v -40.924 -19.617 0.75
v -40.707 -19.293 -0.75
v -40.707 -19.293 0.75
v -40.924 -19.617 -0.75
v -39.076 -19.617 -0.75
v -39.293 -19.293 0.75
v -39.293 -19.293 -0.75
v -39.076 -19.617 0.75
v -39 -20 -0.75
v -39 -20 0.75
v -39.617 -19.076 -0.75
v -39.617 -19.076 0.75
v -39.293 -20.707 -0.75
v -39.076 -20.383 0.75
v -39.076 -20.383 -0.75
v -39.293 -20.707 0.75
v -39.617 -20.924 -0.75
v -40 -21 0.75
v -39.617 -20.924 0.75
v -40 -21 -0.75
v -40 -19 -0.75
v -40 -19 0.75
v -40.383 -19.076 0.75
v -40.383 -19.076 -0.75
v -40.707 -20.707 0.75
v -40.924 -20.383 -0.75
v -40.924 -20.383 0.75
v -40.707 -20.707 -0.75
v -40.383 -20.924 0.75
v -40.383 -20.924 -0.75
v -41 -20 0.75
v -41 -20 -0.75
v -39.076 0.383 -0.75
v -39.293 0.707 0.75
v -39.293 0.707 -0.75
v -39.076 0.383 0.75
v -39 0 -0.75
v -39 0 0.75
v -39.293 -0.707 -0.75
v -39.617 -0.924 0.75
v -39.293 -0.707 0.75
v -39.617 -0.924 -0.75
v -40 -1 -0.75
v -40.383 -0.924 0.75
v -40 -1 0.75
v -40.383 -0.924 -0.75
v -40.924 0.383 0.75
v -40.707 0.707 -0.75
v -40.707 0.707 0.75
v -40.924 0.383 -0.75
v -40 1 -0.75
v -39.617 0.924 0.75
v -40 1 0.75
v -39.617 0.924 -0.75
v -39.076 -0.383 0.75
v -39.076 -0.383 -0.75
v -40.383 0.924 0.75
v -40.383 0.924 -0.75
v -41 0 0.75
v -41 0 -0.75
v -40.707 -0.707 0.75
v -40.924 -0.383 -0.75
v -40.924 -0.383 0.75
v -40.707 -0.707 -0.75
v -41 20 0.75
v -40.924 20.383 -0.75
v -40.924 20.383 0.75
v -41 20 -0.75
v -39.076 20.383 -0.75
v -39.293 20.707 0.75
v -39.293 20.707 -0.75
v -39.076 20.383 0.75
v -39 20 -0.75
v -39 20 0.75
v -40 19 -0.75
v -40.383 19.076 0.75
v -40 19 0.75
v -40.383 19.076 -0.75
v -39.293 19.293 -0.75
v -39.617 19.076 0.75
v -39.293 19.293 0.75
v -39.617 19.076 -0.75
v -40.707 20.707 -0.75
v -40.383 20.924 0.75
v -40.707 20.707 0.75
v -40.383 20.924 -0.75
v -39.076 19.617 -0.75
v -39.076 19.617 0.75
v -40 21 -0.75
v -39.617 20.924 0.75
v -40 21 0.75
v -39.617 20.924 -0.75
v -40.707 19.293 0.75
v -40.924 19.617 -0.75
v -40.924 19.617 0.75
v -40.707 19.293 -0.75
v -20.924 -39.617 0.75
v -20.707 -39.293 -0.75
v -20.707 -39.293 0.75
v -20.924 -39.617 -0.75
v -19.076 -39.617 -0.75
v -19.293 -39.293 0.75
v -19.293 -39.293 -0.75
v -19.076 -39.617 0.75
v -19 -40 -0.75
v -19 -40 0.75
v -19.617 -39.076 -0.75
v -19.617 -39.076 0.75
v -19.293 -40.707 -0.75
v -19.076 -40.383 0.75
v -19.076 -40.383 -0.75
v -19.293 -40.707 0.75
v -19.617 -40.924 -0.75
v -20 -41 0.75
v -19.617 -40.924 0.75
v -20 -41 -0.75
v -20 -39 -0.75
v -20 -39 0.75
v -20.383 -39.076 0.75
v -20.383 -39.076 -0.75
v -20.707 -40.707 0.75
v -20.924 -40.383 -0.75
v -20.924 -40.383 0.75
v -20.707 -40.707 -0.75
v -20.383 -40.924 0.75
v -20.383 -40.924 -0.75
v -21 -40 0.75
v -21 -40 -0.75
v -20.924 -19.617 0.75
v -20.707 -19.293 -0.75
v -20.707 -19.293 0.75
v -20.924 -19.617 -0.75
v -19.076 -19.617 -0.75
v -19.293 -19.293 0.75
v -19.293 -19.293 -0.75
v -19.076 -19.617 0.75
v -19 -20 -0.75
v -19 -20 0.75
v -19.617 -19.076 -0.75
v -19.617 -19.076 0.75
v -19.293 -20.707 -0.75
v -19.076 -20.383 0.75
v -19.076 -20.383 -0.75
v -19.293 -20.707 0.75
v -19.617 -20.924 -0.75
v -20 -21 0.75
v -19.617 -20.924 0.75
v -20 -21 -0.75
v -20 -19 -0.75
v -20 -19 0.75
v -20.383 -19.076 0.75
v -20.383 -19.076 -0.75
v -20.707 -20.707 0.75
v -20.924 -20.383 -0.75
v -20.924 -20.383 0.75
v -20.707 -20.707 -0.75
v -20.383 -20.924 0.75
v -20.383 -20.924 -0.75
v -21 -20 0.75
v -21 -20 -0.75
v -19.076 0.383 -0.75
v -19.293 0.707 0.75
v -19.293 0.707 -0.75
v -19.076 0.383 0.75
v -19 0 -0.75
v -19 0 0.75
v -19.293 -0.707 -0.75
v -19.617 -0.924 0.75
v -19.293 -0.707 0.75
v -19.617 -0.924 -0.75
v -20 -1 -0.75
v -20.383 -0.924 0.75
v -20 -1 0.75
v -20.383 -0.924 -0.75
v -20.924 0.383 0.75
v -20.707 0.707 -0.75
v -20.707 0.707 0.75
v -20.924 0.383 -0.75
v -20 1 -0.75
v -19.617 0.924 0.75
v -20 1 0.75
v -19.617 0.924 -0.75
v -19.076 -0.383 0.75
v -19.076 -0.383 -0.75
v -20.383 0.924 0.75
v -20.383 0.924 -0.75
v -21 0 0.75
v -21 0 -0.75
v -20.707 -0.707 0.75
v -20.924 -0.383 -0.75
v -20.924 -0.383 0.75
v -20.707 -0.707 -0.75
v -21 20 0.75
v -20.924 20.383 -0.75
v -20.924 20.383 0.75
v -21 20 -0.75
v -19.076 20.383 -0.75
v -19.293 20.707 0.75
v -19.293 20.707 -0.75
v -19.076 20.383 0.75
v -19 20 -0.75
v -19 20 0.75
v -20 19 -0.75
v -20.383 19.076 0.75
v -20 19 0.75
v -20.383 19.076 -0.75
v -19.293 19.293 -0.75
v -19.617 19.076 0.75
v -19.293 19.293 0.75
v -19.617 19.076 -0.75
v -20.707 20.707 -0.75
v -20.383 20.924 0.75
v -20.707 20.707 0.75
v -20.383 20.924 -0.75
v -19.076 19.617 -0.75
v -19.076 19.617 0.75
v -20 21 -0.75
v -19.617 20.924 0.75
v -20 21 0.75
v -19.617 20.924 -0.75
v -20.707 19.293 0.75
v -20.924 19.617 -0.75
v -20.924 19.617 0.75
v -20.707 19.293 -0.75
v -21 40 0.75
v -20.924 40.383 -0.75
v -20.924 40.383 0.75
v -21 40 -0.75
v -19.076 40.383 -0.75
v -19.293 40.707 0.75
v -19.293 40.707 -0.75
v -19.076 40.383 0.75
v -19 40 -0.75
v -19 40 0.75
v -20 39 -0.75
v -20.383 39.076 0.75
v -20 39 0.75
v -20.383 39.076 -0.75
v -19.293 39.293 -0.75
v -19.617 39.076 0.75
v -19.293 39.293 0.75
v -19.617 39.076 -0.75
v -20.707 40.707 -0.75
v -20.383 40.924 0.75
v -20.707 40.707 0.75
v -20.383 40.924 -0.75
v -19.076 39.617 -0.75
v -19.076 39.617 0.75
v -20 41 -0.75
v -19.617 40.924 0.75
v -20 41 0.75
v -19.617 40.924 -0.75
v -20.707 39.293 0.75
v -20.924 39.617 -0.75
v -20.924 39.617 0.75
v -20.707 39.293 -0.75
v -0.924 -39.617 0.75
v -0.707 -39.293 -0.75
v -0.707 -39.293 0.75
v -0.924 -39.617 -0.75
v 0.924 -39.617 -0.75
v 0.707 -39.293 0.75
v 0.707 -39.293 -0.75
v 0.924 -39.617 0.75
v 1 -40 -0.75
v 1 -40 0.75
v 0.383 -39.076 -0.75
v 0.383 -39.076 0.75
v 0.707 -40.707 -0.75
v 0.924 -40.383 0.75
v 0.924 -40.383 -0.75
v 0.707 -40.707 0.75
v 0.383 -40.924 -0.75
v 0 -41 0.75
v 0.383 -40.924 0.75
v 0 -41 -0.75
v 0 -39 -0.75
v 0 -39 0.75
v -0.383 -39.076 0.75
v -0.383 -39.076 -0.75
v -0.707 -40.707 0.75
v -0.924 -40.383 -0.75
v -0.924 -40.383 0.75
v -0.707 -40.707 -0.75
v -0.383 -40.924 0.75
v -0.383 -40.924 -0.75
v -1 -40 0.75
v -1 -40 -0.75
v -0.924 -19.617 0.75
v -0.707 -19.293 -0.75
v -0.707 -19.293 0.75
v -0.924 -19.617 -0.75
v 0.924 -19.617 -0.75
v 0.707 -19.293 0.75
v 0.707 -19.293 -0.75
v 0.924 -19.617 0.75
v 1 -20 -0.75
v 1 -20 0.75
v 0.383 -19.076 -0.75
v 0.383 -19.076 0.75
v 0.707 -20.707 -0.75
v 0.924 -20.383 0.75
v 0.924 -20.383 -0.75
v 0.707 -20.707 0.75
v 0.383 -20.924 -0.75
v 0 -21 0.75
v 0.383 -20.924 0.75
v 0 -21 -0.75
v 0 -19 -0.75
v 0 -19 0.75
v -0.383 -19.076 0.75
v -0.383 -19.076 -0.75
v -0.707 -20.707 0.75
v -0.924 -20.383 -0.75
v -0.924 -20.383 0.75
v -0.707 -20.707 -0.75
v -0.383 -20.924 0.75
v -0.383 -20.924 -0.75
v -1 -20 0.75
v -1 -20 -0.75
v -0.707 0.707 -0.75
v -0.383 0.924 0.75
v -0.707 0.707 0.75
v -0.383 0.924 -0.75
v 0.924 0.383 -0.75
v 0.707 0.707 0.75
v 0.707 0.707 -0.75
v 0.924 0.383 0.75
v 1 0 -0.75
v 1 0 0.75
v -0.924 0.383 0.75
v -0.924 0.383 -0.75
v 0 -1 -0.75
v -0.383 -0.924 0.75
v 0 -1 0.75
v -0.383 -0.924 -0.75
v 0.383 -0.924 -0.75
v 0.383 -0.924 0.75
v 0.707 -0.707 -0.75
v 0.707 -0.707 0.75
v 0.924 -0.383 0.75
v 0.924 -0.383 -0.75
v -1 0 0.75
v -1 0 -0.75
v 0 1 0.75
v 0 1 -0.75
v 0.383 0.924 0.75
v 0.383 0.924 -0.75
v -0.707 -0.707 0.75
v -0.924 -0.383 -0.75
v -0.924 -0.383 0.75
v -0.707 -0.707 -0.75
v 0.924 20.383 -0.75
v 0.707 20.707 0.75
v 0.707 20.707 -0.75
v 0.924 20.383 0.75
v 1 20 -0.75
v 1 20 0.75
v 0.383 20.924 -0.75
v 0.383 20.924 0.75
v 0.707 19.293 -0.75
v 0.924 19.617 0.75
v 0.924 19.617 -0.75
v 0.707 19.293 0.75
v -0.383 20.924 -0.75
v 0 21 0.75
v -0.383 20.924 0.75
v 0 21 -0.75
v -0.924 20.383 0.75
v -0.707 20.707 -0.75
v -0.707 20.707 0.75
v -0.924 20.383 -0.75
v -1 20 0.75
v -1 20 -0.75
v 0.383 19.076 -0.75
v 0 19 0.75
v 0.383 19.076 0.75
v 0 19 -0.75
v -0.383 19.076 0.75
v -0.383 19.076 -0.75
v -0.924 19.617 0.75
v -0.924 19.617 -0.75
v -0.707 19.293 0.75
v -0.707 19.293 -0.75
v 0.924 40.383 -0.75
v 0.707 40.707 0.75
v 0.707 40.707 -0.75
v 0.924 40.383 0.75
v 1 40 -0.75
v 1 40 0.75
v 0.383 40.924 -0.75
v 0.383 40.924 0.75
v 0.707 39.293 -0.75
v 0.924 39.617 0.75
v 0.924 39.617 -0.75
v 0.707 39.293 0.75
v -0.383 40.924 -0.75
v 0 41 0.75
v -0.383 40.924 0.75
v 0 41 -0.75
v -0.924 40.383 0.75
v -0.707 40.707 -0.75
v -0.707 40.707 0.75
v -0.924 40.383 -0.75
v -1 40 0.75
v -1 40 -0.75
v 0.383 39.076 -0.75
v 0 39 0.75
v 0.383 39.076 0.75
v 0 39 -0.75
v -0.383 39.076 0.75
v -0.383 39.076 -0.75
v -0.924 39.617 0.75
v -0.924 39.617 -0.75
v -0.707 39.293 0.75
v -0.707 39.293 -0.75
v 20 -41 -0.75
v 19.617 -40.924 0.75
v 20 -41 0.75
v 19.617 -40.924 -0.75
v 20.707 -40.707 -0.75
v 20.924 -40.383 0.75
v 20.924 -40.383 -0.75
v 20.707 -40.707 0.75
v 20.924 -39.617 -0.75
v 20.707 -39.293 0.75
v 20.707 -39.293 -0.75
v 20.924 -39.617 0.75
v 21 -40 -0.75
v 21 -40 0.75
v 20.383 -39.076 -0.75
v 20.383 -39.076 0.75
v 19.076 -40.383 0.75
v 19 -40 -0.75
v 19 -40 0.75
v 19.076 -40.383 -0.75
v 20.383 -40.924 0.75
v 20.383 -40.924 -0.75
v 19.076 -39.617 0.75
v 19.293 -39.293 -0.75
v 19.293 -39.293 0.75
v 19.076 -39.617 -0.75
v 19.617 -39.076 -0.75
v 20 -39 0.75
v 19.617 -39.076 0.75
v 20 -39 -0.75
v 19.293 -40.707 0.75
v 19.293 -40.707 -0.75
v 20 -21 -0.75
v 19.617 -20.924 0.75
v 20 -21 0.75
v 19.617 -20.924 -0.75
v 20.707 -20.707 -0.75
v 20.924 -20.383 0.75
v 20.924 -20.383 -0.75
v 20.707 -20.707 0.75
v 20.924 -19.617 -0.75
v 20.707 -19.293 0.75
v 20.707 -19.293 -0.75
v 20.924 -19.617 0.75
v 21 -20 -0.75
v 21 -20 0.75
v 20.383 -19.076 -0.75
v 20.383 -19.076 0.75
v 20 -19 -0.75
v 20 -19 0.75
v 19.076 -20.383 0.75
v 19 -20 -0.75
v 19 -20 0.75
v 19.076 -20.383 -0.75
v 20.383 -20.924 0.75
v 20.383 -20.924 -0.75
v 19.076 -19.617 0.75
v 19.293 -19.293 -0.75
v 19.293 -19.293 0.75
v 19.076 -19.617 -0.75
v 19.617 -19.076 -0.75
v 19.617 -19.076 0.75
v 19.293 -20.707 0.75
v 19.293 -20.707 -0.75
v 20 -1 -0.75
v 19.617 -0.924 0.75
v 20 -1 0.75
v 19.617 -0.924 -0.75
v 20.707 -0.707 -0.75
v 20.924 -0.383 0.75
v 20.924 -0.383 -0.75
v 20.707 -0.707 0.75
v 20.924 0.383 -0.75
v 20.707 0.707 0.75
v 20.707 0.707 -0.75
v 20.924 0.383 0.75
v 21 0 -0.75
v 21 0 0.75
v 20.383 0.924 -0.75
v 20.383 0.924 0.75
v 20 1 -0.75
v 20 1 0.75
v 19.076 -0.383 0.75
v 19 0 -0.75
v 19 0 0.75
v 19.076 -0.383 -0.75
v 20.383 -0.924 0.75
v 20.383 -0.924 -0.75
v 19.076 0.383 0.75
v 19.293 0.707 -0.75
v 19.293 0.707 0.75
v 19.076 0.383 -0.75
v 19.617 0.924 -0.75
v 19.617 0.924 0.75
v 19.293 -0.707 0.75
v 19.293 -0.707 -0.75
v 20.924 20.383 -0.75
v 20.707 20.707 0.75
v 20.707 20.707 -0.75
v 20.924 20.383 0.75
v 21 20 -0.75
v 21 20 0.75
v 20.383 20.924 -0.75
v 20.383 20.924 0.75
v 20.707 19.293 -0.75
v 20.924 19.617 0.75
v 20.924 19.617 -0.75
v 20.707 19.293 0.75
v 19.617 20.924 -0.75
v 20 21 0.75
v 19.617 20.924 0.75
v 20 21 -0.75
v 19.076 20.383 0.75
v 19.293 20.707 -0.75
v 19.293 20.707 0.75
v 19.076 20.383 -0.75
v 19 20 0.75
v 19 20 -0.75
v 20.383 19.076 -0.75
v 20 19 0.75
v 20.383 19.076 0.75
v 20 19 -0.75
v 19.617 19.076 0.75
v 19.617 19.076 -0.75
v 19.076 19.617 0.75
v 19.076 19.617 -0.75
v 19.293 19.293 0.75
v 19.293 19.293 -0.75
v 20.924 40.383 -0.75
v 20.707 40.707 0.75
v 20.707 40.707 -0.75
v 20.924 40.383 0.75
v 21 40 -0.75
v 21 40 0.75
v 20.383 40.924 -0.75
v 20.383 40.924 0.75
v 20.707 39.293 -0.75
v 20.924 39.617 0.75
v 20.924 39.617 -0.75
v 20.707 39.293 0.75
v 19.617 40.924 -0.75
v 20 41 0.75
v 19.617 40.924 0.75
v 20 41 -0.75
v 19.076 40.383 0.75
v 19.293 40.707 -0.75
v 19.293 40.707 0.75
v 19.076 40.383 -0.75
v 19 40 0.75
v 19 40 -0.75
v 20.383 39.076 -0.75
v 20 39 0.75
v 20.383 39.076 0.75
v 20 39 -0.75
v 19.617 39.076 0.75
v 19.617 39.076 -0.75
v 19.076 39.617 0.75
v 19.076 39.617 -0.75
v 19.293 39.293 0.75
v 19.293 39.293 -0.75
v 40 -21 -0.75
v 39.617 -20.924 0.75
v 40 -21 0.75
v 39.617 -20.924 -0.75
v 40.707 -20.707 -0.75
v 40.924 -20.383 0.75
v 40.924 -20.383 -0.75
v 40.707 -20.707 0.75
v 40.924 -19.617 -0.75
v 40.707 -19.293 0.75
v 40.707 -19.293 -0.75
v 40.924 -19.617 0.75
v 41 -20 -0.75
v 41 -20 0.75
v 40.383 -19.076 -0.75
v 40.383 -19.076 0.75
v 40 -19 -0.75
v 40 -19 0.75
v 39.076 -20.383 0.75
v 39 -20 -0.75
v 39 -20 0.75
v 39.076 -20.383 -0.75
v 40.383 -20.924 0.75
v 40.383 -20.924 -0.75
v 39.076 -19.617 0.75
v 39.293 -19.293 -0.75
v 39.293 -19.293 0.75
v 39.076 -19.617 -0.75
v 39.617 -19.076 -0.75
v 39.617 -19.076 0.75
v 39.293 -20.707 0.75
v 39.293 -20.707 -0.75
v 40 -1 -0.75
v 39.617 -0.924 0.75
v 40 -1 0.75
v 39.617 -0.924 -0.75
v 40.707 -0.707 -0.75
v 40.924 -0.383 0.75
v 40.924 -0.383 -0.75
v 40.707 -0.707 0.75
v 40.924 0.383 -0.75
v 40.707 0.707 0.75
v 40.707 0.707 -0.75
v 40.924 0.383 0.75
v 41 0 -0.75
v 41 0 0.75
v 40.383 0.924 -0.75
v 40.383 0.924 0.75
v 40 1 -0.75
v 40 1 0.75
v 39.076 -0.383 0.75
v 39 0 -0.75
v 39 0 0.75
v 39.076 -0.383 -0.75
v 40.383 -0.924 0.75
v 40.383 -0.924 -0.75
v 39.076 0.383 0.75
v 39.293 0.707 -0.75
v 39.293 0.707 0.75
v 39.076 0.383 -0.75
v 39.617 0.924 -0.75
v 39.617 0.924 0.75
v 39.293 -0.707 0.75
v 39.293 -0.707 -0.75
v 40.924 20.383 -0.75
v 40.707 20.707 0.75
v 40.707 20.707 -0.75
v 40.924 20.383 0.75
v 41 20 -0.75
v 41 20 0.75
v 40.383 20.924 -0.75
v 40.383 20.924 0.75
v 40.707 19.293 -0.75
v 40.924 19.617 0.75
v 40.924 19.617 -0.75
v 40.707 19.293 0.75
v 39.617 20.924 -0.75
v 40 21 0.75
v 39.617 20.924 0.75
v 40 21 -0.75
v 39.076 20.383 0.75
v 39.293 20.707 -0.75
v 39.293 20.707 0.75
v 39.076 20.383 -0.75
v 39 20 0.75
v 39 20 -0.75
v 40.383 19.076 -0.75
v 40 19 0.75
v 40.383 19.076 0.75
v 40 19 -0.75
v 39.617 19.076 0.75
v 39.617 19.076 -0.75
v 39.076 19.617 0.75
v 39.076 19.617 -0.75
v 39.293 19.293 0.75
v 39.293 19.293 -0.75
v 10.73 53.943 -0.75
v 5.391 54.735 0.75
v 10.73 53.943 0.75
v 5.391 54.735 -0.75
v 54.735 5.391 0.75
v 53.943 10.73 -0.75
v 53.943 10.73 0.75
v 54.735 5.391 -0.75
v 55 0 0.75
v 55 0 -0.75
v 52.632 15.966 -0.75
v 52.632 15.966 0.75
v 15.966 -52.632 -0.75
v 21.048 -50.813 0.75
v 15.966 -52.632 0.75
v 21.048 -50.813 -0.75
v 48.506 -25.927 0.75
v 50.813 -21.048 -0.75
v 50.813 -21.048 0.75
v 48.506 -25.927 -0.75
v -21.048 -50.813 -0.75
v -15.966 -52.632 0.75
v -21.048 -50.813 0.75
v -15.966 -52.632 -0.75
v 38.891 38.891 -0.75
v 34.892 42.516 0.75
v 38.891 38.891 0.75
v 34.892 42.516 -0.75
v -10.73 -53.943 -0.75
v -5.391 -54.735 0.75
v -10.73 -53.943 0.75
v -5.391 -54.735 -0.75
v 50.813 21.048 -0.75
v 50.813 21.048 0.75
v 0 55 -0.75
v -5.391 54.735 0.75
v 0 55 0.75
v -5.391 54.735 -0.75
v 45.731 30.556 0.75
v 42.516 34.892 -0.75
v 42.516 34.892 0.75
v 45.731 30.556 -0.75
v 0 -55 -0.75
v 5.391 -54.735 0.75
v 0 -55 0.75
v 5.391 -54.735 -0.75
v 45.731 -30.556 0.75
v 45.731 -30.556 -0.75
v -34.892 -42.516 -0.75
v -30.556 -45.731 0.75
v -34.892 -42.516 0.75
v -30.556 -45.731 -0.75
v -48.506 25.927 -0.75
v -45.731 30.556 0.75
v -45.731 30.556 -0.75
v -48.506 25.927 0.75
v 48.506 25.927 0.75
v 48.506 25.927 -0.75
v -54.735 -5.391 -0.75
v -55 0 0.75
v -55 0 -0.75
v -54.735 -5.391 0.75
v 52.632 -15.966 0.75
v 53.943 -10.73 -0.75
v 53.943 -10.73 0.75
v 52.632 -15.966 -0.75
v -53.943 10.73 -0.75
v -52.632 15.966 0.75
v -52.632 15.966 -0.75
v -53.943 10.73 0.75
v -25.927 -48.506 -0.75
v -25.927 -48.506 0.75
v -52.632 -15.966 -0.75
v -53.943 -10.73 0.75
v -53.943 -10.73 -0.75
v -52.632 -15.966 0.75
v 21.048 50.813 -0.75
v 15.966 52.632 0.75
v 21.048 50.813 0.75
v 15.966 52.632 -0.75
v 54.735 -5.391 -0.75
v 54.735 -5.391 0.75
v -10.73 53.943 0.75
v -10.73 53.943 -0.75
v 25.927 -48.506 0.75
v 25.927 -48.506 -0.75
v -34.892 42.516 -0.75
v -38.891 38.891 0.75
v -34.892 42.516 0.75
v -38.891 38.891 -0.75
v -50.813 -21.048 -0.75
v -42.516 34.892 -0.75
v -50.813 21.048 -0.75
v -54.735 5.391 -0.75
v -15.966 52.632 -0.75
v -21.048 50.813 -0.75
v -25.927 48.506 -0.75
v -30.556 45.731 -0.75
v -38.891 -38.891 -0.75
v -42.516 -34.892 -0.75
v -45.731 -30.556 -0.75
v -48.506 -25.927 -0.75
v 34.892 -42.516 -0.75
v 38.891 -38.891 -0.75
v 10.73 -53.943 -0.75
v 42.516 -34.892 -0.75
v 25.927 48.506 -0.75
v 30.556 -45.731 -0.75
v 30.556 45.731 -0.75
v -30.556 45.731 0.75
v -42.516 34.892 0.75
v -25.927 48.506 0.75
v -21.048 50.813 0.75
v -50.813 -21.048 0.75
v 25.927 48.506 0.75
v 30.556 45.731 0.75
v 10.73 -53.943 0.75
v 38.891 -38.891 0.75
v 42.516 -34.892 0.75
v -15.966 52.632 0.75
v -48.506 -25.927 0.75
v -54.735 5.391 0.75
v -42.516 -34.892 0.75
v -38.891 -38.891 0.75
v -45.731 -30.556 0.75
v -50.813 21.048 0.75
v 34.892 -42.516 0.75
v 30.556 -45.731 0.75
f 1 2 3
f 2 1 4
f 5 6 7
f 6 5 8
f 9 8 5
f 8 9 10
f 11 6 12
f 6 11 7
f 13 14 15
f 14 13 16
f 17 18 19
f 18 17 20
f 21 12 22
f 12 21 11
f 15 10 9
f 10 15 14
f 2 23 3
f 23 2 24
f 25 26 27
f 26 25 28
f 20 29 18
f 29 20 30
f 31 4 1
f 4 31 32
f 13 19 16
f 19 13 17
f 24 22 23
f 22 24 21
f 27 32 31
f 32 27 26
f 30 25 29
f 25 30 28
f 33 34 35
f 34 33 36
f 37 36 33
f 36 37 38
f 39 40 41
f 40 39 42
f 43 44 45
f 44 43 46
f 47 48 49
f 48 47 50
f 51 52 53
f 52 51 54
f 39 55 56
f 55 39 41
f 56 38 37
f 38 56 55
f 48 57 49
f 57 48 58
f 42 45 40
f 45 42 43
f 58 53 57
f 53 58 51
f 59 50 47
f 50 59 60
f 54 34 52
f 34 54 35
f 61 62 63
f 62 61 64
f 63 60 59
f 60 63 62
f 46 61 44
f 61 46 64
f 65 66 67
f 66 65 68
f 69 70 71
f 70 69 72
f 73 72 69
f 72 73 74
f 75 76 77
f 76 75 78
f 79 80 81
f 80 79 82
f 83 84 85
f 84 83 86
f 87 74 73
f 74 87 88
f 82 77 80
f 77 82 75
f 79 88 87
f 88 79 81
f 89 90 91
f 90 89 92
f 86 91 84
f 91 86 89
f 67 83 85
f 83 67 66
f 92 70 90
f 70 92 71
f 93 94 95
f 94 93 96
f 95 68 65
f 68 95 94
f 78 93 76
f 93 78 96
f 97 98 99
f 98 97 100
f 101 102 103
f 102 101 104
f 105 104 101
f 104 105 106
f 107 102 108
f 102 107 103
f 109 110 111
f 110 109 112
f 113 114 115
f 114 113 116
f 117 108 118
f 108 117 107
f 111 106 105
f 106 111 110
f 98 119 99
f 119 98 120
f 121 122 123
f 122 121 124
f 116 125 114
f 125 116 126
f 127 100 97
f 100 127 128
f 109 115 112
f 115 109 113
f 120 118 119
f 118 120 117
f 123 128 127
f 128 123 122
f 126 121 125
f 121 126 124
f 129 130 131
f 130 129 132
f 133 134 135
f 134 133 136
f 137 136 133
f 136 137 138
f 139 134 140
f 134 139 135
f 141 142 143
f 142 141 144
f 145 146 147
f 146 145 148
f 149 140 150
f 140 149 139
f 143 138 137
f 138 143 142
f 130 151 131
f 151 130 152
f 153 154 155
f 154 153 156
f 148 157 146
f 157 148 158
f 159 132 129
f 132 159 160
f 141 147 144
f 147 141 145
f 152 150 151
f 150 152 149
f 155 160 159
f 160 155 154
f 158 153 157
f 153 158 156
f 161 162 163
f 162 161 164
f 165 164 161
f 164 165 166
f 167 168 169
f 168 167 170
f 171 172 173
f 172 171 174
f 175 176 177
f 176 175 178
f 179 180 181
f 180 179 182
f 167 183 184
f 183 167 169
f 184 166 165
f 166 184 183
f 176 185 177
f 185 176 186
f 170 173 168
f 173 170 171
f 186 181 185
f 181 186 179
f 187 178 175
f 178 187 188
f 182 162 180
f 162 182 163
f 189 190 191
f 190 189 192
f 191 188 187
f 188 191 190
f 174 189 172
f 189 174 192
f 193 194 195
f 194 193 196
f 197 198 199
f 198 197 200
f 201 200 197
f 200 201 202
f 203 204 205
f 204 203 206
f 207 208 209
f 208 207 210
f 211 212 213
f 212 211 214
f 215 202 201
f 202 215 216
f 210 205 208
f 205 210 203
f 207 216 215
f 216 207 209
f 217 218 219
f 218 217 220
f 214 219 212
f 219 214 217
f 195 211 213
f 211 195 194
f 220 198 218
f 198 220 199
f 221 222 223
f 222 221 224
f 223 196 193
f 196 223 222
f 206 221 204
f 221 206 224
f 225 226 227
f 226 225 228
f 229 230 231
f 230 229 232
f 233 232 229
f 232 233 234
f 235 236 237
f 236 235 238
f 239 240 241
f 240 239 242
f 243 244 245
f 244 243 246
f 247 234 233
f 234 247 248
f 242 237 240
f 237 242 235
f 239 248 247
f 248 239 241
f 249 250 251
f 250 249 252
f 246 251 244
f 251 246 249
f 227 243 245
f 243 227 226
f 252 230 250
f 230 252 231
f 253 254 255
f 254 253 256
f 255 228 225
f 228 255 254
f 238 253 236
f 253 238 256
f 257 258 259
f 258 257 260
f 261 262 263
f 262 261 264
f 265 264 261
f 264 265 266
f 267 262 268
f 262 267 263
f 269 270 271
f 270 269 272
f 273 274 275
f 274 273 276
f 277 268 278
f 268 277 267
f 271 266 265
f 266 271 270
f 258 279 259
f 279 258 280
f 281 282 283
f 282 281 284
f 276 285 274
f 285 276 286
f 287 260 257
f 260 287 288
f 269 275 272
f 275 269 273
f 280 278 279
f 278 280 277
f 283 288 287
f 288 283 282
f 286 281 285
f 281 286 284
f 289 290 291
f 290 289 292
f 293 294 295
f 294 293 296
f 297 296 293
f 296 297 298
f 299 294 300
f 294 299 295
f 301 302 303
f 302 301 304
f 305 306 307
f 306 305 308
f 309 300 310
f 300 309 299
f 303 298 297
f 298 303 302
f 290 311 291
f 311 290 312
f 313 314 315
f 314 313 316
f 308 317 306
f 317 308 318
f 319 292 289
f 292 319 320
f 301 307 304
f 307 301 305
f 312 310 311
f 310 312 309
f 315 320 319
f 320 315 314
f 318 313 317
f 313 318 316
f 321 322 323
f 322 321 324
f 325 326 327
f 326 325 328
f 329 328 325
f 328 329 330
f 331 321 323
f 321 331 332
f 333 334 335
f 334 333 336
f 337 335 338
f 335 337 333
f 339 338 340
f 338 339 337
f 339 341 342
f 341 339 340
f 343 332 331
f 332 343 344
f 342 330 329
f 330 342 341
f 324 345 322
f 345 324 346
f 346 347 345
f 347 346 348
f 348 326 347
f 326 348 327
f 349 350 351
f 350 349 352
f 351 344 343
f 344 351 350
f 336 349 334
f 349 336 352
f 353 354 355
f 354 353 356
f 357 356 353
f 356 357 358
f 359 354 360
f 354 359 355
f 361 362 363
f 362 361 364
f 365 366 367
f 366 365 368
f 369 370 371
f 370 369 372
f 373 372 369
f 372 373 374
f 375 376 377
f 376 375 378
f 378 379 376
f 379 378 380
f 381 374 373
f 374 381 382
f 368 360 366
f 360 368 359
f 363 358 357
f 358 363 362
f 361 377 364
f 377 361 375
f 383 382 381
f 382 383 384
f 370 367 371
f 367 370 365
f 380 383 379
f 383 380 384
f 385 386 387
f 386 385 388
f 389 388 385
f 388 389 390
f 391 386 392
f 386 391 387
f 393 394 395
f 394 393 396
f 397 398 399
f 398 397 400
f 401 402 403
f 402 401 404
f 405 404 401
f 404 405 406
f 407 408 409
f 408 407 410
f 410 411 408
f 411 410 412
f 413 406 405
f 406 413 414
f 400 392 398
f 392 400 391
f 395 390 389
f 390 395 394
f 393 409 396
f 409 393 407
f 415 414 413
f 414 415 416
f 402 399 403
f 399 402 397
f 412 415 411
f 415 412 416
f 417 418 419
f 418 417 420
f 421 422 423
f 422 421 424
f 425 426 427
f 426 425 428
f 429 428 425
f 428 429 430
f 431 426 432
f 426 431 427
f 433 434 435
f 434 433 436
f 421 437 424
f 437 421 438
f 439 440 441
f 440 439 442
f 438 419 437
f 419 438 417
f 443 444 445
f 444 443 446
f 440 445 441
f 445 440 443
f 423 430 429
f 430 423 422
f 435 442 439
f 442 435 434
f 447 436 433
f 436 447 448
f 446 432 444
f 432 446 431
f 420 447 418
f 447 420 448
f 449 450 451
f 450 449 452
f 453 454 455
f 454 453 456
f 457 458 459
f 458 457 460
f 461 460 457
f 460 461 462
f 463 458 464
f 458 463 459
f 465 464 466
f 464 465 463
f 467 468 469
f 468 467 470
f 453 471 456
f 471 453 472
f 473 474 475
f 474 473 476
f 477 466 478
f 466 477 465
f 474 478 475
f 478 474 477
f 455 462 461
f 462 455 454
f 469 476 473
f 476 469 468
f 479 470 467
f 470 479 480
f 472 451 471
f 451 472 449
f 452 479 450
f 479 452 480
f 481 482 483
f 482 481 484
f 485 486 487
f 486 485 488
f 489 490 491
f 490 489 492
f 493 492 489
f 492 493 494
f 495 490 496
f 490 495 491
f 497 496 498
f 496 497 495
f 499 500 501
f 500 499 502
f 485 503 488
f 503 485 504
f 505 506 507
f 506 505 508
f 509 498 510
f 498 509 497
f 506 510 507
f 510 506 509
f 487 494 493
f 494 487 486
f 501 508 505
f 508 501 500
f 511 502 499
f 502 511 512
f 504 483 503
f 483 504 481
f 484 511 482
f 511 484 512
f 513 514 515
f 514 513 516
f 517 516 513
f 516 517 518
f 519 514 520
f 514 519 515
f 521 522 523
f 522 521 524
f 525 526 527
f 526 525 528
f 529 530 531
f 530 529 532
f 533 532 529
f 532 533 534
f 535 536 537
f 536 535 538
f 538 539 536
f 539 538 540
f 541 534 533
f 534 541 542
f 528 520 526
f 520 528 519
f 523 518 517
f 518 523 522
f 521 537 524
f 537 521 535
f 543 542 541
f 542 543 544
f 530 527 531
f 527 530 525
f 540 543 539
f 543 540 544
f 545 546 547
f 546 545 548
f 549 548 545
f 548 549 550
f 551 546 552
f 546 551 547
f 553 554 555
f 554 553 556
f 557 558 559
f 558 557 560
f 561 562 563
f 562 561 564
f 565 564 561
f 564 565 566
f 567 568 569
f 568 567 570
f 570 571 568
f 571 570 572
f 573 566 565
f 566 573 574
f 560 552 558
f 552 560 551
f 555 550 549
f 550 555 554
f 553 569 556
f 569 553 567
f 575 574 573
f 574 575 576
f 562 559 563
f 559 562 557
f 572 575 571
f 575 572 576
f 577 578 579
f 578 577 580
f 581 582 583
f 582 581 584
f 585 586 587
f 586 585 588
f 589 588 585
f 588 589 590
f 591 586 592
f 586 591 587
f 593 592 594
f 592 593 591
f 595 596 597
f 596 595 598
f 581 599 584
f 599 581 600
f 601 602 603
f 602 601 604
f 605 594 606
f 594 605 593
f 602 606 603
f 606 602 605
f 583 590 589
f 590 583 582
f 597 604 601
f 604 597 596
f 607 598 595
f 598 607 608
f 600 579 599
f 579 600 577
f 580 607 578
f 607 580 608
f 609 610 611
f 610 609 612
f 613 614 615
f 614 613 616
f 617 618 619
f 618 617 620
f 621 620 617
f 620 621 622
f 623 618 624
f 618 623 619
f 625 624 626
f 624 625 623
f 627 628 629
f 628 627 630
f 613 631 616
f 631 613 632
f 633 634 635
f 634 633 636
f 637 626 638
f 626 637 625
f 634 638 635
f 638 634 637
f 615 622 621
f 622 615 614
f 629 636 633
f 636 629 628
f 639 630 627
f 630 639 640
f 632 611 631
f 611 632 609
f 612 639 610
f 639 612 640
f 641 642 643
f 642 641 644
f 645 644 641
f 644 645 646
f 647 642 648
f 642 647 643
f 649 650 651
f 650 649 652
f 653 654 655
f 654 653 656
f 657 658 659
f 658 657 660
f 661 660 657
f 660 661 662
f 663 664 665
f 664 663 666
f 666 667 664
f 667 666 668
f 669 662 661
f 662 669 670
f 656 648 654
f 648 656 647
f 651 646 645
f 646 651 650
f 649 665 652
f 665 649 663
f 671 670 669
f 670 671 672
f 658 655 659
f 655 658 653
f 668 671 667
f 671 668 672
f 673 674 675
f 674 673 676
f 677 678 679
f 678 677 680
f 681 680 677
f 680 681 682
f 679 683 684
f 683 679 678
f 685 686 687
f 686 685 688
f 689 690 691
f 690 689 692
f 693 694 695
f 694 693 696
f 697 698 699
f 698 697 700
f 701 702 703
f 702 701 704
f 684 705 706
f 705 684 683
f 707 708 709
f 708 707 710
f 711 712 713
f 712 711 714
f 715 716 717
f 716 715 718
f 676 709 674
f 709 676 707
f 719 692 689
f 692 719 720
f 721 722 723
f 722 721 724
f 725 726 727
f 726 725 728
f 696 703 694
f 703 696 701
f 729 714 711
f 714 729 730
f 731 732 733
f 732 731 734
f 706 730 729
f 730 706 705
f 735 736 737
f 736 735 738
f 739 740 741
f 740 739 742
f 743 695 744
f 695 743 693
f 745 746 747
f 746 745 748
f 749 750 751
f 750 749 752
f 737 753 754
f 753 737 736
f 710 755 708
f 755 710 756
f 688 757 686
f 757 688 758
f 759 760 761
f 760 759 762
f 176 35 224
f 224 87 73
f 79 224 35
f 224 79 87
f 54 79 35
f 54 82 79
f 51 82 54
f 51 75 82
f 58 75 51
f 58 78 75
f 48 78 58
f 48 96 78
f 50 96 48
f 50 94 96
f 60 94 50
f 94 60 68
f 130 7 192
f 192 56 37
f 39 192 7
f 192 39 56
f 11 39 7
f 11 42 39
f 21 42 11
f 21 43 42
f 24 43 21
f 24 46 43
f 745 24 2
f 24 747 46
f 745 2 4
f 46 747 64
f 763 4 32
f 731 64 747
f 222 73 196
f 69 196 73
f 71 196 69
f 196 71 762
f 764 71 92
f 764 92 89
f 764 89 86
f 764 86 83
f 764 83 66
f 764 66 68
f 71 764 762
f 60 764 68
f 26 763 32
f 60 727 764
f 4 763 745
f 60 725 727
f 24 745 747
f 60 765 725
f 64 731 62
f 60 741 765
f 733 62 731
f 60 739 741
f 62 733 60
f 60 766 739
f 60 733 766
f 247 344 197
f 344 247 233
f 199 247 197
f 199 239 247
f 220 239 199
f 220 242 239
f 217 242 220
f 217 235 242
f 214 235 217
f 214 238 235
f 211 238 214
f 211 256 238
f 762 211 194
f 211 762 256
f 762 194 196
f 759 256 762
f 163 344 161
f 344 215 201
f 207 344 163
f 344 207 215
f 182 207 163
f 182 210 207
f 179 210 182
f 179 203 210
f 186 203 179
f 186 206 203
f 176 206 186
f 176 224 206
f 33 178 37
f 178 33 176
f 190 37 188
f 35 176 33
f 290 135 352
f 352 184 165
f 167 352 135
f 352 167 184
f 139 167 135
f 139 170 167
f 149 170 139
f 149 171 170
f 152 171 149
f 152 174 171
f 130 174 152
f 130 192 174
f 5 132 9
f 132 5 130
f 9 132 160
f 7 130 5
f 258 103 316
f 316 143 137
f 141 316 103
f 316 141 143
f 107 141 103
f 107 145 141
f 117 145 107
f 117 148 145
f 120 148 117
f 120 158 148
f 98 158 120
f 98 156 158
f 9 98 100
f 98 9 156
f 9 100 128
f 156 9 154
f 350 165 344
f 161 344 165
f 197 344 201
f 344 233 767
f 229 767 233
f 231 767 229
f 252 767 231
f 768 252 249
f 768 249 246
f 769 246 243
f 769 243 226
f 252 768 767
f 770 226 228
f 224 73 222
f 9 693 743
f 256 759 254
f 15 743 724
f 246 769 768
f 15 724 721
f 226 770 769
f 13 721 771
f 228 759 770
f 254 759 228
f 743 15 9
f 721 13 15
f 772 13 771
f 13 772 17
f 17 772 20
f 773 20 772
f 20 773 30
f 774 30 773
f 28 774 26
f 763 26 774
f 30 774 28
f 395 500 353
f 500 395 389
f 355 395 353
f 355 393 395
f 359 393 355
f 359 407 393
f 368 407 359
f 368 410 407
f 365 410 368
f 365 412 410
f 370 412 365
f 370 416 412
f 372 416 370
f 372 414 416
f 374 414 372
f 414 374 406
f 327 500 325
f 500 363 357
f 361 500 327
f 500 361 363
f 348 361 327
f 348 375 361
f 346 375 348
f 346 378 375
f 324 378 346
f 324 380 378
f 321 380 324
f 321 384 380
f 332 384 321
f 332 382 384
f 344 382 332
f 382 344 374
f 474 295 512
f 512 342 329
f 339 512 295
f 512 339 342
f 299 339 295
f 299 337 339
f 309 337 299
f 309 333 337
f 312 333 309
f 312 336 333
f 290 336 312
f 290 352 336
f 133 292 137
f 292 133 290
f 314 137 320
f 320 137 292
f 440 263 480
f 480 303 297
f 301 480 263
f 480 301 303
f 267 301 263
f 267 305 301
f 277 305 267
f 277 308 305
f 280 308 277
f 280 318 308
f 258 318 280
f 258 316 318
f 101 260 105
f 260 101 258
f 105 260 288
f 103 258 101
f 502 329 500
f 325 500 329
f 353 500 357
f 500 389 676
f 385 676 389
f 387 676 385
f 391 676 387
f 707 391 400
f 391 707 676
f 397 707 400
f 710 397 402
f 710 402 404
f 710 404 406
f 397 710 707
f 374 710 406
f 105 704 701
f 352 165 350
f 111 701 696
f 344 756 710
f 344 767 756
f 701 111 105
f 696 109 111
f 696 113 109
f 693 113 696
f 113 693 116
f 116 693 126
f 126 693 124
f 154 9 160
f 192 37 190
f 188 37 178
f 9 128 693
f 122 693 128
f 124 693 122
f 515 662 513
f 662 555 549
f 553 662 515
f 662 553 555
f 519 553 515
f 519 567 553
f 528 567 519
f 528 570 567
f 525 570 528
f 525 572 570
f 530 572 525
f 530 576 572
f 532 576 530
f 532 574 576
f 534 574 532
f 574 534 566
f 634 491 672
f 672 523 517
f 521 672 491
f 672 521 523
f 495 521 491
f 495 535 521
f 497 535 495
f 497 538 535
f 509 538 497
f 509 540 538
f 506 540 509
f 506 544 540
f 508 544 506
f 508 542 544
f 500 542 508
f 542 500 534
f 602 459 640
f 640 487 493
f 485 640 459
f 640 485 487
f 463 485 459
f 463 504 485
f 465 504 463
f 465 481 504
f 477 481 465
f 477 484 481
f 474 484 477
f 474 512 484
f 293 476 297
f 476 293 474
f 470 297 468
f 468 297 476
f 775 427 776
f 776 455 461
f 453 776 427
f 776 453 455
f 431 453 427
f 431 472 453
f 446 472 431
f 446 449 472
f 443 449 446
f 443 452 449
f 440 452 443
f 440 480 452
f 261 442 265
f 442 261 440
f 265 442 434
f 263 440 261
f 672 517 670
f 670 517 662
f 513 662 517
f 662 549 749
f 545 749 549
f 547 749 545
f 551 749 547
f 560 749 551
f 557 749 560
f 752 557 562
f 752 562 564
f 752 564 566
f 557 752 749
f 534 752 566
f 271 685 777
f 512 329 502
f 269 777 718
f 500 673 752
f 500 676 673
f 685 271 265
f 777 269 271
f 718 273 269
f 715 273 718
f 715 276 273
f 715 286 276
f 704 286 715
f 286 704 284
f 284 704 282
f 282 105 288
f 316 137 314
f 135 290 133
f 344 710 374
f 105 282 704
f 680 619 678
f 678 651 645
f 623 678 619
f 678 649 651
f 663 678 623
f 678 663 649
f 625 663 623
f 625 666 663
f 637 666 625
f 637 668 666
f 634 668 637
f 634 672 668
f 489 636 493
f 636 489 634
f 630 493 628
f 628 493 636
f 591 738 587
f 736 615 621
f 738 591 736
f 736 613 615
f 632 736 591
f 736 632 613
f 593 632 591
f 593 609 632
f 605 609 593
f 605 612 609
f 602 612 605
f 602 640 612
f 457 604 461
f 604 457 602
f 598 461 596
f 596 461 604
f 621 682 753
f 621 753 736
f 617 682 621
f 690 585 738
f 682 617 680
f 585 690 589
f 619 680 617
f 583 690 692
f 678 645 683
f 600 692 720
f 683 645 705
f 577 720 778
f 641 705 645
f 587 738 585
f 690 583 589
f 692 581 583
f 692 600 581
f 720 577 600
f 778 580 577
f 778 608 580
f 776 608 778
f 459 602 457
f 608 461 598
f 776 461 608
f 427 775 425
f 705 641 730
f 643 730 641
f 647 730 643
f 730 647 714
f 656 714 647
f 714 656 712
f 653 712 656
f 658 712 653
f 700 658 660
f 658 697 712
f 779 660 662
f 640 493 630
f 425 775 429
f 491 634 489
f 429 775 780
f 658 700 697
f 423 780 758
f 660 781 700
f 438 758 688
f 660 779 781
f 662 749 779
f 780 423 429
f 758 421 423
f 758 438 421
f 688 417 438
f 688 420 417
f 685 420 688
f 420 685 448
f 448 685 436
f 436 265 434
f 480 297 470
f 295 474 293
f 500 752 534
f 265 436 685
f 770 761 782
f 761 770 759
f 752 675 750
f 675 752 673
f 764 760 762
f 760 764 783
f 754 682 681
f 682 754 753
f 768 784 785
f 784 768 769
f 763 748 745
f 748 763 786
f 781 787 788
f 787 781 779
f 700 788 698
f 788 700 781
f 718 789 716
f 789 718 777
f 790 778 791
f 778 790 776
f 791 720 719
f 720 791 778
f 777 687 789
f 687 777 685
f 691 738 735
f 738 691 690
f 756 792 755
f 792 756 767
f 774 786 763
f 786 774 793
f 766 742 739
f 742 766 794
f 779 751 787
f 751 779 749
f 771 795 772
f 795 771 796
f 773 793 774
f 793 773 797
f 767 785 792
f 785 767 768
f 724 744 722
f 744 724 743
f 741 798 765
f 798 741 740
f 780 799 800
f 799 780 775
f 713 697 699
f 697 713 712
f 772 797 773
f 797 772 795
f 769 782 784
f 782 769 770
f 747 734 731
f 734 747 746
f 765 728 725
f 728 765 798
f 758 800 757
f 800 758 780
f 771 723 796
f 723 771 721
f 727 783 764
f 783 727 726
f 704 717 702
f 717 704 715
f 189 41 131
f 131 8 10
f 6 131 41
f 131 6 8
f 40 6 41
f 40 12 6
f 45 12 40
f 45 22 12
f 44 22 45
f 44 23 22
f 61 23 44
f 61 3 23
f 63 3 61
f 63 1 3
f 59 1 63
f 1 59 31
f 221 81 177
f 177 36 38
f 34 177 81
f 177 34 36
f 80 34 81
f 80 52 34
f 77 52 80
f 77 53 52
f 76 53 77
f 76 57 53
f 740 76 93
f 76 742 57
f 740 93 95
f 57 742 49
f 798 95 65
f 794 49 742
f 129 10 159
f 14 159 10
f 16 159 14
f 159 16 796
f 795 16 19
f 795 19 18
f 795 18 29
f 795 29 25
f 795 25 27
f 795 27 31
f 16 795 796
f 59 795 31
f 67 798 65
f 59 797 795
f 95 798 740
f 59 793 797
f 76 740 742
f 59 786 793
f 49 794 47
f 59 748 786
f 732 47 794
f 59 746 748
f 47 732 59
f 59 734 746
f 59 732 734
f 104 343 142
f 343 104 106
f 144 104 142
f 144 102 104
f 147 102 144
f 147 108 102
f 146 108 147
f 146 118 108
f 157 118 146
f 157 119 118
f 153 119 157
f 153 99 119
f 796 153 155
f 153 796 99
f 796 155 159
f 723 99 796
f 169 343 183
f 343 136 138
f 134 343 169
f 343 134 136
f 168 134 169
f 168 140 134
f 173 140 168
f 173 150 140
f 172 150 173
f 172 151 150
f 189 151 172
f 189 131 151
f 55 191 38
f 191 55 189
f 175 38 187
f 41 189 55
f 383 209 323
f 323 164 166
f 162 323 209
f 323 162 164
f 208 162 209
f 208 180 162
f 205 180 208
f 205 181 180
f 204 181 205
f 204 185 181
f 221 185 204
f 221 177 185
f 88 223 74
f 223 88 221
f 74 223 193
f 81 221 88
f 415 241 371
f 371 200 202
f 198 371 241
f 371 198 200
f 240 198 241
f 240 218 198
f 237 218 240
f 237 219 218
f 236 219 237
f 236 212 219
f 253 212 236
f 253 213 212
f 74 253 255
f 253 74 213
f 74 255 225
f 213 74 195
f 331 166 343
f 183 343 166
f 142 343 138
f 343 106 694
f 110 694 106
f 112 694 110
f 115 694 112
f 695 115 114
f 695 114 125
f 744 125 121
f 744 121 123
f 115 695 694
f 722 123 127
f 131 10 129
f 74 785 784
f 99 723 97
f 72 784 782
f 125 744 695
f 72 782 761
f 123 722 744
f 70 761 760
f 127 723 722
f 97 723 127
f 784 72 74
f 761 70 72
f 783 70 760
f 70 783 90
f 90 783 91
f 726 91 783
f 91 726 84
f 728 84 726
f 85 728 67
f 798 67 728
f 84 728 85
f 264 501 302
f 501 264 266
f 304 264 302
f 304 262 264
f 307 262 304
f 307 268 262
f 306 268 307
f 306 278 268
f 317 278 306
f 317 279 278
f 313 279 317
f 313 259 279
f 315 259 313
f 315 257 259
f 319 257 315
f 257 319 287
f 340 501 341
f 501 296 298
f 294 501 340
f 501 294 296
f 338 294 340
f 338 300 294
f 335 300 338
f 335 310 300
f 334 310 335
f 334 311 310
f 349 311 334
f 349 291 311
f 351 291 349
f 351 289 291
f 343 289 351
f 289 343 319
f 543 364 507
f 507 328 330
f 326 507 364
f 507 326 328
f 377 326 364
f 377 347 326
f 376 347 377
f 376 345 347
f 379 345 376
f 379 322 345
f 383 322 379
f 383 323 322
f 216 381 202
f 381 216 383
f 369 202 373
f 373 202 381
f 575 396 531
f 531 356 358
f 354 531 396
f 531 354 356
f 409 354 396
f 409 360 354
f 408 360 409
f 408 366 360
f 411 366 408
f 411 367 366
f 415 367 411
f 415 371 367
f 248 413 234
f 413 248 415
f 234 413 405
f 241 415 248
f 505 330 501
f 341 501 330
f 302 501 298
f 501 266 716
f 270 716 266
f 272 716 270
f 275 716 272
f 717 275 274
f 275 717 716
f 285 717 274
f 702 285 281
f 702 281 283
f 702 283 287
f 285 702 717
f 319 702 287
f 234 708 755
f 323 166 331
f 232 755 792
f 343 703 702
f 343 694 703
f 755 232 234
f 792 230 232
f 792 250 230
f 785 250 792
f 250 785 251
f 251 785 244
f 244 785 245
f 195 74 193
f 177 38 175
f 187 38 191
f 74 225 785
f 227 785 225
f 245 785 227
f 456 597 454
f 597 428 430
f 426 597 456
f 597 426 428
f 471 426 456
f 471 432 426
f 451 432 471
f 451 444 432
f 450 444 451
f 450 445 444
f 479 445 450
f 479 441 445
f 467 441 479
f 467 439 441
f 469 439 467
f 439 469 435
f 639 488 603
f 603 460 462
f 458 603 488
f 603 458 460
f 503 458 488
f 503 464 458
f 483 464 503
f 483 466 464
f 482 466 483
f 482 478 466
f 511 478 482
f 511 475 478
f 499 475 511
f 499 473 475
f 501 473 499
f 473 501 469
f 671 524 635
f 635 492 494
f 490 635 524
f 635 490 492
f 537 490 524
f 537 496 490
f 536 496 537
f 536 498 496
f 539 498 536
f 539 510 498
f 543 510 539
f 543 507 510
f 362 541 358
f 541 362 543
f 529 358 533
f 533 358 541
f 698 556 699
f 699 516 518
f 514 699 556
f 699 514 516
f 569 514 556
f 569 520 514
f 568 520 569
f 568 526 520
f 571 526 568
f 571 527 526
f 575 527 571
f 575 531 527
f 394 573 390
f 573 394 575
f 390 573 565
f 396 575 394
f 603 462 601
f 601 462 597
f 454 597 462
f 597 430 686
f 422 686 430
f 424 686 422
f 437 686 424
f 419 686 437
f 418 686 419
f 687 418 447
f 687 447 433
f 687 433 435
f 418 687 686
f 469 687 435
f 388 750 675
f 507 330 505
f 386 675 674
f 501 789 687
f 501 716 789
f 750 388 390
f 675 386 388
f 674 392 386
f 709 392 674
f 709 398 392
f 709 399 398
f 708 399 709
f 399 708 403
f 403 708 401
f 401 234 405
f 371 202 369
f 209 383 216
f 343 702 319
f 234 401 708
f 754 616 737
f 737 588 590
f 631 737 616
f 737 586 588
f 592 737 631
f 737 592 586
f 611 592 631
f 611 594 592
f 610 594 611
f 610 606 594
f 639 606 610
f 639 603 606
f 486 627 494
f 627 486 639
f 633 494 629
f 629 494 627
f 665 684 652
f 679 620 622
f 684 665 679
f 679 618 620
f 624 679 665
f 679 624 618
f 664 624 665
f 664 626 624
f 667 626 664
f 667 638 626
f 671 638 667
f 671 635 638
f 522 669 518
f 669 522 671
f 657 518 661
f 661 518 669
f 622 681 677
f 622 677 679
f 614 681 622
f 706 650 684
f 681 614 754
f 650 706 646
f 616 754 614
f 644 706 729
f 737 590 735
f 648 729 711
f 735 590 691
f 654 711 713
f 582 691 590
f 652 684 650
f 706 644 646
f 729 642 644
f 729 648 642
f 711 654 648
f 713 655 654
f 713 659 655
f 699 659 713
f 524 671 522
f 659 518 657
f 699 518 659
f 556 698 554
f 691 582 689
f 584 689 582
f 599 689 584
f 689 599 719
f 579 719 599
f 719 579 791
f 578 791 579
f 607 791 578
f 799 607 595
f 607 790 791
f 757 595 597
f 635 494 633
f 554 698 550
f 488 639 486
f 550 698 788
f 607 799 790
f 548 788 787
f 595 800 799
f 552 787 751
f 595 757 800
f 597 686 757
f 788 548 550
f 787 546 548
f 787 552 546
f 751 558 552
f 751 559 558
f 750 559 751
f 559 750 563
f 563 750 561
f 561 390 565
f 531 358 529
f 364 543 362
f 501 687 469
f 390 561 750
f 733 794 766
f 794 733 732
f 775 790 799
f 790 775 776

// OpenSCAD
/*
 * Flatness Test Plate
 * 
 * Useful for checking bed leveling and first layer consistency across a large area.
 * Especially important before printing large parts like the main housing or end plates.
 */

module flatness_test_plate() {
    difference() {
        cylinder(d=110, h=1.5, center=true, $fn=64);
        
        // Grid of small holes for measurement reference
        for (x = [-40:20:40]) {
            for (y = [-40:20:40]) {
                translate([x, y, 0])
                    cylinder(d=2, h=2, center=true, $fn=16);
            }
        }
    }
}

flatness_test_plate();
